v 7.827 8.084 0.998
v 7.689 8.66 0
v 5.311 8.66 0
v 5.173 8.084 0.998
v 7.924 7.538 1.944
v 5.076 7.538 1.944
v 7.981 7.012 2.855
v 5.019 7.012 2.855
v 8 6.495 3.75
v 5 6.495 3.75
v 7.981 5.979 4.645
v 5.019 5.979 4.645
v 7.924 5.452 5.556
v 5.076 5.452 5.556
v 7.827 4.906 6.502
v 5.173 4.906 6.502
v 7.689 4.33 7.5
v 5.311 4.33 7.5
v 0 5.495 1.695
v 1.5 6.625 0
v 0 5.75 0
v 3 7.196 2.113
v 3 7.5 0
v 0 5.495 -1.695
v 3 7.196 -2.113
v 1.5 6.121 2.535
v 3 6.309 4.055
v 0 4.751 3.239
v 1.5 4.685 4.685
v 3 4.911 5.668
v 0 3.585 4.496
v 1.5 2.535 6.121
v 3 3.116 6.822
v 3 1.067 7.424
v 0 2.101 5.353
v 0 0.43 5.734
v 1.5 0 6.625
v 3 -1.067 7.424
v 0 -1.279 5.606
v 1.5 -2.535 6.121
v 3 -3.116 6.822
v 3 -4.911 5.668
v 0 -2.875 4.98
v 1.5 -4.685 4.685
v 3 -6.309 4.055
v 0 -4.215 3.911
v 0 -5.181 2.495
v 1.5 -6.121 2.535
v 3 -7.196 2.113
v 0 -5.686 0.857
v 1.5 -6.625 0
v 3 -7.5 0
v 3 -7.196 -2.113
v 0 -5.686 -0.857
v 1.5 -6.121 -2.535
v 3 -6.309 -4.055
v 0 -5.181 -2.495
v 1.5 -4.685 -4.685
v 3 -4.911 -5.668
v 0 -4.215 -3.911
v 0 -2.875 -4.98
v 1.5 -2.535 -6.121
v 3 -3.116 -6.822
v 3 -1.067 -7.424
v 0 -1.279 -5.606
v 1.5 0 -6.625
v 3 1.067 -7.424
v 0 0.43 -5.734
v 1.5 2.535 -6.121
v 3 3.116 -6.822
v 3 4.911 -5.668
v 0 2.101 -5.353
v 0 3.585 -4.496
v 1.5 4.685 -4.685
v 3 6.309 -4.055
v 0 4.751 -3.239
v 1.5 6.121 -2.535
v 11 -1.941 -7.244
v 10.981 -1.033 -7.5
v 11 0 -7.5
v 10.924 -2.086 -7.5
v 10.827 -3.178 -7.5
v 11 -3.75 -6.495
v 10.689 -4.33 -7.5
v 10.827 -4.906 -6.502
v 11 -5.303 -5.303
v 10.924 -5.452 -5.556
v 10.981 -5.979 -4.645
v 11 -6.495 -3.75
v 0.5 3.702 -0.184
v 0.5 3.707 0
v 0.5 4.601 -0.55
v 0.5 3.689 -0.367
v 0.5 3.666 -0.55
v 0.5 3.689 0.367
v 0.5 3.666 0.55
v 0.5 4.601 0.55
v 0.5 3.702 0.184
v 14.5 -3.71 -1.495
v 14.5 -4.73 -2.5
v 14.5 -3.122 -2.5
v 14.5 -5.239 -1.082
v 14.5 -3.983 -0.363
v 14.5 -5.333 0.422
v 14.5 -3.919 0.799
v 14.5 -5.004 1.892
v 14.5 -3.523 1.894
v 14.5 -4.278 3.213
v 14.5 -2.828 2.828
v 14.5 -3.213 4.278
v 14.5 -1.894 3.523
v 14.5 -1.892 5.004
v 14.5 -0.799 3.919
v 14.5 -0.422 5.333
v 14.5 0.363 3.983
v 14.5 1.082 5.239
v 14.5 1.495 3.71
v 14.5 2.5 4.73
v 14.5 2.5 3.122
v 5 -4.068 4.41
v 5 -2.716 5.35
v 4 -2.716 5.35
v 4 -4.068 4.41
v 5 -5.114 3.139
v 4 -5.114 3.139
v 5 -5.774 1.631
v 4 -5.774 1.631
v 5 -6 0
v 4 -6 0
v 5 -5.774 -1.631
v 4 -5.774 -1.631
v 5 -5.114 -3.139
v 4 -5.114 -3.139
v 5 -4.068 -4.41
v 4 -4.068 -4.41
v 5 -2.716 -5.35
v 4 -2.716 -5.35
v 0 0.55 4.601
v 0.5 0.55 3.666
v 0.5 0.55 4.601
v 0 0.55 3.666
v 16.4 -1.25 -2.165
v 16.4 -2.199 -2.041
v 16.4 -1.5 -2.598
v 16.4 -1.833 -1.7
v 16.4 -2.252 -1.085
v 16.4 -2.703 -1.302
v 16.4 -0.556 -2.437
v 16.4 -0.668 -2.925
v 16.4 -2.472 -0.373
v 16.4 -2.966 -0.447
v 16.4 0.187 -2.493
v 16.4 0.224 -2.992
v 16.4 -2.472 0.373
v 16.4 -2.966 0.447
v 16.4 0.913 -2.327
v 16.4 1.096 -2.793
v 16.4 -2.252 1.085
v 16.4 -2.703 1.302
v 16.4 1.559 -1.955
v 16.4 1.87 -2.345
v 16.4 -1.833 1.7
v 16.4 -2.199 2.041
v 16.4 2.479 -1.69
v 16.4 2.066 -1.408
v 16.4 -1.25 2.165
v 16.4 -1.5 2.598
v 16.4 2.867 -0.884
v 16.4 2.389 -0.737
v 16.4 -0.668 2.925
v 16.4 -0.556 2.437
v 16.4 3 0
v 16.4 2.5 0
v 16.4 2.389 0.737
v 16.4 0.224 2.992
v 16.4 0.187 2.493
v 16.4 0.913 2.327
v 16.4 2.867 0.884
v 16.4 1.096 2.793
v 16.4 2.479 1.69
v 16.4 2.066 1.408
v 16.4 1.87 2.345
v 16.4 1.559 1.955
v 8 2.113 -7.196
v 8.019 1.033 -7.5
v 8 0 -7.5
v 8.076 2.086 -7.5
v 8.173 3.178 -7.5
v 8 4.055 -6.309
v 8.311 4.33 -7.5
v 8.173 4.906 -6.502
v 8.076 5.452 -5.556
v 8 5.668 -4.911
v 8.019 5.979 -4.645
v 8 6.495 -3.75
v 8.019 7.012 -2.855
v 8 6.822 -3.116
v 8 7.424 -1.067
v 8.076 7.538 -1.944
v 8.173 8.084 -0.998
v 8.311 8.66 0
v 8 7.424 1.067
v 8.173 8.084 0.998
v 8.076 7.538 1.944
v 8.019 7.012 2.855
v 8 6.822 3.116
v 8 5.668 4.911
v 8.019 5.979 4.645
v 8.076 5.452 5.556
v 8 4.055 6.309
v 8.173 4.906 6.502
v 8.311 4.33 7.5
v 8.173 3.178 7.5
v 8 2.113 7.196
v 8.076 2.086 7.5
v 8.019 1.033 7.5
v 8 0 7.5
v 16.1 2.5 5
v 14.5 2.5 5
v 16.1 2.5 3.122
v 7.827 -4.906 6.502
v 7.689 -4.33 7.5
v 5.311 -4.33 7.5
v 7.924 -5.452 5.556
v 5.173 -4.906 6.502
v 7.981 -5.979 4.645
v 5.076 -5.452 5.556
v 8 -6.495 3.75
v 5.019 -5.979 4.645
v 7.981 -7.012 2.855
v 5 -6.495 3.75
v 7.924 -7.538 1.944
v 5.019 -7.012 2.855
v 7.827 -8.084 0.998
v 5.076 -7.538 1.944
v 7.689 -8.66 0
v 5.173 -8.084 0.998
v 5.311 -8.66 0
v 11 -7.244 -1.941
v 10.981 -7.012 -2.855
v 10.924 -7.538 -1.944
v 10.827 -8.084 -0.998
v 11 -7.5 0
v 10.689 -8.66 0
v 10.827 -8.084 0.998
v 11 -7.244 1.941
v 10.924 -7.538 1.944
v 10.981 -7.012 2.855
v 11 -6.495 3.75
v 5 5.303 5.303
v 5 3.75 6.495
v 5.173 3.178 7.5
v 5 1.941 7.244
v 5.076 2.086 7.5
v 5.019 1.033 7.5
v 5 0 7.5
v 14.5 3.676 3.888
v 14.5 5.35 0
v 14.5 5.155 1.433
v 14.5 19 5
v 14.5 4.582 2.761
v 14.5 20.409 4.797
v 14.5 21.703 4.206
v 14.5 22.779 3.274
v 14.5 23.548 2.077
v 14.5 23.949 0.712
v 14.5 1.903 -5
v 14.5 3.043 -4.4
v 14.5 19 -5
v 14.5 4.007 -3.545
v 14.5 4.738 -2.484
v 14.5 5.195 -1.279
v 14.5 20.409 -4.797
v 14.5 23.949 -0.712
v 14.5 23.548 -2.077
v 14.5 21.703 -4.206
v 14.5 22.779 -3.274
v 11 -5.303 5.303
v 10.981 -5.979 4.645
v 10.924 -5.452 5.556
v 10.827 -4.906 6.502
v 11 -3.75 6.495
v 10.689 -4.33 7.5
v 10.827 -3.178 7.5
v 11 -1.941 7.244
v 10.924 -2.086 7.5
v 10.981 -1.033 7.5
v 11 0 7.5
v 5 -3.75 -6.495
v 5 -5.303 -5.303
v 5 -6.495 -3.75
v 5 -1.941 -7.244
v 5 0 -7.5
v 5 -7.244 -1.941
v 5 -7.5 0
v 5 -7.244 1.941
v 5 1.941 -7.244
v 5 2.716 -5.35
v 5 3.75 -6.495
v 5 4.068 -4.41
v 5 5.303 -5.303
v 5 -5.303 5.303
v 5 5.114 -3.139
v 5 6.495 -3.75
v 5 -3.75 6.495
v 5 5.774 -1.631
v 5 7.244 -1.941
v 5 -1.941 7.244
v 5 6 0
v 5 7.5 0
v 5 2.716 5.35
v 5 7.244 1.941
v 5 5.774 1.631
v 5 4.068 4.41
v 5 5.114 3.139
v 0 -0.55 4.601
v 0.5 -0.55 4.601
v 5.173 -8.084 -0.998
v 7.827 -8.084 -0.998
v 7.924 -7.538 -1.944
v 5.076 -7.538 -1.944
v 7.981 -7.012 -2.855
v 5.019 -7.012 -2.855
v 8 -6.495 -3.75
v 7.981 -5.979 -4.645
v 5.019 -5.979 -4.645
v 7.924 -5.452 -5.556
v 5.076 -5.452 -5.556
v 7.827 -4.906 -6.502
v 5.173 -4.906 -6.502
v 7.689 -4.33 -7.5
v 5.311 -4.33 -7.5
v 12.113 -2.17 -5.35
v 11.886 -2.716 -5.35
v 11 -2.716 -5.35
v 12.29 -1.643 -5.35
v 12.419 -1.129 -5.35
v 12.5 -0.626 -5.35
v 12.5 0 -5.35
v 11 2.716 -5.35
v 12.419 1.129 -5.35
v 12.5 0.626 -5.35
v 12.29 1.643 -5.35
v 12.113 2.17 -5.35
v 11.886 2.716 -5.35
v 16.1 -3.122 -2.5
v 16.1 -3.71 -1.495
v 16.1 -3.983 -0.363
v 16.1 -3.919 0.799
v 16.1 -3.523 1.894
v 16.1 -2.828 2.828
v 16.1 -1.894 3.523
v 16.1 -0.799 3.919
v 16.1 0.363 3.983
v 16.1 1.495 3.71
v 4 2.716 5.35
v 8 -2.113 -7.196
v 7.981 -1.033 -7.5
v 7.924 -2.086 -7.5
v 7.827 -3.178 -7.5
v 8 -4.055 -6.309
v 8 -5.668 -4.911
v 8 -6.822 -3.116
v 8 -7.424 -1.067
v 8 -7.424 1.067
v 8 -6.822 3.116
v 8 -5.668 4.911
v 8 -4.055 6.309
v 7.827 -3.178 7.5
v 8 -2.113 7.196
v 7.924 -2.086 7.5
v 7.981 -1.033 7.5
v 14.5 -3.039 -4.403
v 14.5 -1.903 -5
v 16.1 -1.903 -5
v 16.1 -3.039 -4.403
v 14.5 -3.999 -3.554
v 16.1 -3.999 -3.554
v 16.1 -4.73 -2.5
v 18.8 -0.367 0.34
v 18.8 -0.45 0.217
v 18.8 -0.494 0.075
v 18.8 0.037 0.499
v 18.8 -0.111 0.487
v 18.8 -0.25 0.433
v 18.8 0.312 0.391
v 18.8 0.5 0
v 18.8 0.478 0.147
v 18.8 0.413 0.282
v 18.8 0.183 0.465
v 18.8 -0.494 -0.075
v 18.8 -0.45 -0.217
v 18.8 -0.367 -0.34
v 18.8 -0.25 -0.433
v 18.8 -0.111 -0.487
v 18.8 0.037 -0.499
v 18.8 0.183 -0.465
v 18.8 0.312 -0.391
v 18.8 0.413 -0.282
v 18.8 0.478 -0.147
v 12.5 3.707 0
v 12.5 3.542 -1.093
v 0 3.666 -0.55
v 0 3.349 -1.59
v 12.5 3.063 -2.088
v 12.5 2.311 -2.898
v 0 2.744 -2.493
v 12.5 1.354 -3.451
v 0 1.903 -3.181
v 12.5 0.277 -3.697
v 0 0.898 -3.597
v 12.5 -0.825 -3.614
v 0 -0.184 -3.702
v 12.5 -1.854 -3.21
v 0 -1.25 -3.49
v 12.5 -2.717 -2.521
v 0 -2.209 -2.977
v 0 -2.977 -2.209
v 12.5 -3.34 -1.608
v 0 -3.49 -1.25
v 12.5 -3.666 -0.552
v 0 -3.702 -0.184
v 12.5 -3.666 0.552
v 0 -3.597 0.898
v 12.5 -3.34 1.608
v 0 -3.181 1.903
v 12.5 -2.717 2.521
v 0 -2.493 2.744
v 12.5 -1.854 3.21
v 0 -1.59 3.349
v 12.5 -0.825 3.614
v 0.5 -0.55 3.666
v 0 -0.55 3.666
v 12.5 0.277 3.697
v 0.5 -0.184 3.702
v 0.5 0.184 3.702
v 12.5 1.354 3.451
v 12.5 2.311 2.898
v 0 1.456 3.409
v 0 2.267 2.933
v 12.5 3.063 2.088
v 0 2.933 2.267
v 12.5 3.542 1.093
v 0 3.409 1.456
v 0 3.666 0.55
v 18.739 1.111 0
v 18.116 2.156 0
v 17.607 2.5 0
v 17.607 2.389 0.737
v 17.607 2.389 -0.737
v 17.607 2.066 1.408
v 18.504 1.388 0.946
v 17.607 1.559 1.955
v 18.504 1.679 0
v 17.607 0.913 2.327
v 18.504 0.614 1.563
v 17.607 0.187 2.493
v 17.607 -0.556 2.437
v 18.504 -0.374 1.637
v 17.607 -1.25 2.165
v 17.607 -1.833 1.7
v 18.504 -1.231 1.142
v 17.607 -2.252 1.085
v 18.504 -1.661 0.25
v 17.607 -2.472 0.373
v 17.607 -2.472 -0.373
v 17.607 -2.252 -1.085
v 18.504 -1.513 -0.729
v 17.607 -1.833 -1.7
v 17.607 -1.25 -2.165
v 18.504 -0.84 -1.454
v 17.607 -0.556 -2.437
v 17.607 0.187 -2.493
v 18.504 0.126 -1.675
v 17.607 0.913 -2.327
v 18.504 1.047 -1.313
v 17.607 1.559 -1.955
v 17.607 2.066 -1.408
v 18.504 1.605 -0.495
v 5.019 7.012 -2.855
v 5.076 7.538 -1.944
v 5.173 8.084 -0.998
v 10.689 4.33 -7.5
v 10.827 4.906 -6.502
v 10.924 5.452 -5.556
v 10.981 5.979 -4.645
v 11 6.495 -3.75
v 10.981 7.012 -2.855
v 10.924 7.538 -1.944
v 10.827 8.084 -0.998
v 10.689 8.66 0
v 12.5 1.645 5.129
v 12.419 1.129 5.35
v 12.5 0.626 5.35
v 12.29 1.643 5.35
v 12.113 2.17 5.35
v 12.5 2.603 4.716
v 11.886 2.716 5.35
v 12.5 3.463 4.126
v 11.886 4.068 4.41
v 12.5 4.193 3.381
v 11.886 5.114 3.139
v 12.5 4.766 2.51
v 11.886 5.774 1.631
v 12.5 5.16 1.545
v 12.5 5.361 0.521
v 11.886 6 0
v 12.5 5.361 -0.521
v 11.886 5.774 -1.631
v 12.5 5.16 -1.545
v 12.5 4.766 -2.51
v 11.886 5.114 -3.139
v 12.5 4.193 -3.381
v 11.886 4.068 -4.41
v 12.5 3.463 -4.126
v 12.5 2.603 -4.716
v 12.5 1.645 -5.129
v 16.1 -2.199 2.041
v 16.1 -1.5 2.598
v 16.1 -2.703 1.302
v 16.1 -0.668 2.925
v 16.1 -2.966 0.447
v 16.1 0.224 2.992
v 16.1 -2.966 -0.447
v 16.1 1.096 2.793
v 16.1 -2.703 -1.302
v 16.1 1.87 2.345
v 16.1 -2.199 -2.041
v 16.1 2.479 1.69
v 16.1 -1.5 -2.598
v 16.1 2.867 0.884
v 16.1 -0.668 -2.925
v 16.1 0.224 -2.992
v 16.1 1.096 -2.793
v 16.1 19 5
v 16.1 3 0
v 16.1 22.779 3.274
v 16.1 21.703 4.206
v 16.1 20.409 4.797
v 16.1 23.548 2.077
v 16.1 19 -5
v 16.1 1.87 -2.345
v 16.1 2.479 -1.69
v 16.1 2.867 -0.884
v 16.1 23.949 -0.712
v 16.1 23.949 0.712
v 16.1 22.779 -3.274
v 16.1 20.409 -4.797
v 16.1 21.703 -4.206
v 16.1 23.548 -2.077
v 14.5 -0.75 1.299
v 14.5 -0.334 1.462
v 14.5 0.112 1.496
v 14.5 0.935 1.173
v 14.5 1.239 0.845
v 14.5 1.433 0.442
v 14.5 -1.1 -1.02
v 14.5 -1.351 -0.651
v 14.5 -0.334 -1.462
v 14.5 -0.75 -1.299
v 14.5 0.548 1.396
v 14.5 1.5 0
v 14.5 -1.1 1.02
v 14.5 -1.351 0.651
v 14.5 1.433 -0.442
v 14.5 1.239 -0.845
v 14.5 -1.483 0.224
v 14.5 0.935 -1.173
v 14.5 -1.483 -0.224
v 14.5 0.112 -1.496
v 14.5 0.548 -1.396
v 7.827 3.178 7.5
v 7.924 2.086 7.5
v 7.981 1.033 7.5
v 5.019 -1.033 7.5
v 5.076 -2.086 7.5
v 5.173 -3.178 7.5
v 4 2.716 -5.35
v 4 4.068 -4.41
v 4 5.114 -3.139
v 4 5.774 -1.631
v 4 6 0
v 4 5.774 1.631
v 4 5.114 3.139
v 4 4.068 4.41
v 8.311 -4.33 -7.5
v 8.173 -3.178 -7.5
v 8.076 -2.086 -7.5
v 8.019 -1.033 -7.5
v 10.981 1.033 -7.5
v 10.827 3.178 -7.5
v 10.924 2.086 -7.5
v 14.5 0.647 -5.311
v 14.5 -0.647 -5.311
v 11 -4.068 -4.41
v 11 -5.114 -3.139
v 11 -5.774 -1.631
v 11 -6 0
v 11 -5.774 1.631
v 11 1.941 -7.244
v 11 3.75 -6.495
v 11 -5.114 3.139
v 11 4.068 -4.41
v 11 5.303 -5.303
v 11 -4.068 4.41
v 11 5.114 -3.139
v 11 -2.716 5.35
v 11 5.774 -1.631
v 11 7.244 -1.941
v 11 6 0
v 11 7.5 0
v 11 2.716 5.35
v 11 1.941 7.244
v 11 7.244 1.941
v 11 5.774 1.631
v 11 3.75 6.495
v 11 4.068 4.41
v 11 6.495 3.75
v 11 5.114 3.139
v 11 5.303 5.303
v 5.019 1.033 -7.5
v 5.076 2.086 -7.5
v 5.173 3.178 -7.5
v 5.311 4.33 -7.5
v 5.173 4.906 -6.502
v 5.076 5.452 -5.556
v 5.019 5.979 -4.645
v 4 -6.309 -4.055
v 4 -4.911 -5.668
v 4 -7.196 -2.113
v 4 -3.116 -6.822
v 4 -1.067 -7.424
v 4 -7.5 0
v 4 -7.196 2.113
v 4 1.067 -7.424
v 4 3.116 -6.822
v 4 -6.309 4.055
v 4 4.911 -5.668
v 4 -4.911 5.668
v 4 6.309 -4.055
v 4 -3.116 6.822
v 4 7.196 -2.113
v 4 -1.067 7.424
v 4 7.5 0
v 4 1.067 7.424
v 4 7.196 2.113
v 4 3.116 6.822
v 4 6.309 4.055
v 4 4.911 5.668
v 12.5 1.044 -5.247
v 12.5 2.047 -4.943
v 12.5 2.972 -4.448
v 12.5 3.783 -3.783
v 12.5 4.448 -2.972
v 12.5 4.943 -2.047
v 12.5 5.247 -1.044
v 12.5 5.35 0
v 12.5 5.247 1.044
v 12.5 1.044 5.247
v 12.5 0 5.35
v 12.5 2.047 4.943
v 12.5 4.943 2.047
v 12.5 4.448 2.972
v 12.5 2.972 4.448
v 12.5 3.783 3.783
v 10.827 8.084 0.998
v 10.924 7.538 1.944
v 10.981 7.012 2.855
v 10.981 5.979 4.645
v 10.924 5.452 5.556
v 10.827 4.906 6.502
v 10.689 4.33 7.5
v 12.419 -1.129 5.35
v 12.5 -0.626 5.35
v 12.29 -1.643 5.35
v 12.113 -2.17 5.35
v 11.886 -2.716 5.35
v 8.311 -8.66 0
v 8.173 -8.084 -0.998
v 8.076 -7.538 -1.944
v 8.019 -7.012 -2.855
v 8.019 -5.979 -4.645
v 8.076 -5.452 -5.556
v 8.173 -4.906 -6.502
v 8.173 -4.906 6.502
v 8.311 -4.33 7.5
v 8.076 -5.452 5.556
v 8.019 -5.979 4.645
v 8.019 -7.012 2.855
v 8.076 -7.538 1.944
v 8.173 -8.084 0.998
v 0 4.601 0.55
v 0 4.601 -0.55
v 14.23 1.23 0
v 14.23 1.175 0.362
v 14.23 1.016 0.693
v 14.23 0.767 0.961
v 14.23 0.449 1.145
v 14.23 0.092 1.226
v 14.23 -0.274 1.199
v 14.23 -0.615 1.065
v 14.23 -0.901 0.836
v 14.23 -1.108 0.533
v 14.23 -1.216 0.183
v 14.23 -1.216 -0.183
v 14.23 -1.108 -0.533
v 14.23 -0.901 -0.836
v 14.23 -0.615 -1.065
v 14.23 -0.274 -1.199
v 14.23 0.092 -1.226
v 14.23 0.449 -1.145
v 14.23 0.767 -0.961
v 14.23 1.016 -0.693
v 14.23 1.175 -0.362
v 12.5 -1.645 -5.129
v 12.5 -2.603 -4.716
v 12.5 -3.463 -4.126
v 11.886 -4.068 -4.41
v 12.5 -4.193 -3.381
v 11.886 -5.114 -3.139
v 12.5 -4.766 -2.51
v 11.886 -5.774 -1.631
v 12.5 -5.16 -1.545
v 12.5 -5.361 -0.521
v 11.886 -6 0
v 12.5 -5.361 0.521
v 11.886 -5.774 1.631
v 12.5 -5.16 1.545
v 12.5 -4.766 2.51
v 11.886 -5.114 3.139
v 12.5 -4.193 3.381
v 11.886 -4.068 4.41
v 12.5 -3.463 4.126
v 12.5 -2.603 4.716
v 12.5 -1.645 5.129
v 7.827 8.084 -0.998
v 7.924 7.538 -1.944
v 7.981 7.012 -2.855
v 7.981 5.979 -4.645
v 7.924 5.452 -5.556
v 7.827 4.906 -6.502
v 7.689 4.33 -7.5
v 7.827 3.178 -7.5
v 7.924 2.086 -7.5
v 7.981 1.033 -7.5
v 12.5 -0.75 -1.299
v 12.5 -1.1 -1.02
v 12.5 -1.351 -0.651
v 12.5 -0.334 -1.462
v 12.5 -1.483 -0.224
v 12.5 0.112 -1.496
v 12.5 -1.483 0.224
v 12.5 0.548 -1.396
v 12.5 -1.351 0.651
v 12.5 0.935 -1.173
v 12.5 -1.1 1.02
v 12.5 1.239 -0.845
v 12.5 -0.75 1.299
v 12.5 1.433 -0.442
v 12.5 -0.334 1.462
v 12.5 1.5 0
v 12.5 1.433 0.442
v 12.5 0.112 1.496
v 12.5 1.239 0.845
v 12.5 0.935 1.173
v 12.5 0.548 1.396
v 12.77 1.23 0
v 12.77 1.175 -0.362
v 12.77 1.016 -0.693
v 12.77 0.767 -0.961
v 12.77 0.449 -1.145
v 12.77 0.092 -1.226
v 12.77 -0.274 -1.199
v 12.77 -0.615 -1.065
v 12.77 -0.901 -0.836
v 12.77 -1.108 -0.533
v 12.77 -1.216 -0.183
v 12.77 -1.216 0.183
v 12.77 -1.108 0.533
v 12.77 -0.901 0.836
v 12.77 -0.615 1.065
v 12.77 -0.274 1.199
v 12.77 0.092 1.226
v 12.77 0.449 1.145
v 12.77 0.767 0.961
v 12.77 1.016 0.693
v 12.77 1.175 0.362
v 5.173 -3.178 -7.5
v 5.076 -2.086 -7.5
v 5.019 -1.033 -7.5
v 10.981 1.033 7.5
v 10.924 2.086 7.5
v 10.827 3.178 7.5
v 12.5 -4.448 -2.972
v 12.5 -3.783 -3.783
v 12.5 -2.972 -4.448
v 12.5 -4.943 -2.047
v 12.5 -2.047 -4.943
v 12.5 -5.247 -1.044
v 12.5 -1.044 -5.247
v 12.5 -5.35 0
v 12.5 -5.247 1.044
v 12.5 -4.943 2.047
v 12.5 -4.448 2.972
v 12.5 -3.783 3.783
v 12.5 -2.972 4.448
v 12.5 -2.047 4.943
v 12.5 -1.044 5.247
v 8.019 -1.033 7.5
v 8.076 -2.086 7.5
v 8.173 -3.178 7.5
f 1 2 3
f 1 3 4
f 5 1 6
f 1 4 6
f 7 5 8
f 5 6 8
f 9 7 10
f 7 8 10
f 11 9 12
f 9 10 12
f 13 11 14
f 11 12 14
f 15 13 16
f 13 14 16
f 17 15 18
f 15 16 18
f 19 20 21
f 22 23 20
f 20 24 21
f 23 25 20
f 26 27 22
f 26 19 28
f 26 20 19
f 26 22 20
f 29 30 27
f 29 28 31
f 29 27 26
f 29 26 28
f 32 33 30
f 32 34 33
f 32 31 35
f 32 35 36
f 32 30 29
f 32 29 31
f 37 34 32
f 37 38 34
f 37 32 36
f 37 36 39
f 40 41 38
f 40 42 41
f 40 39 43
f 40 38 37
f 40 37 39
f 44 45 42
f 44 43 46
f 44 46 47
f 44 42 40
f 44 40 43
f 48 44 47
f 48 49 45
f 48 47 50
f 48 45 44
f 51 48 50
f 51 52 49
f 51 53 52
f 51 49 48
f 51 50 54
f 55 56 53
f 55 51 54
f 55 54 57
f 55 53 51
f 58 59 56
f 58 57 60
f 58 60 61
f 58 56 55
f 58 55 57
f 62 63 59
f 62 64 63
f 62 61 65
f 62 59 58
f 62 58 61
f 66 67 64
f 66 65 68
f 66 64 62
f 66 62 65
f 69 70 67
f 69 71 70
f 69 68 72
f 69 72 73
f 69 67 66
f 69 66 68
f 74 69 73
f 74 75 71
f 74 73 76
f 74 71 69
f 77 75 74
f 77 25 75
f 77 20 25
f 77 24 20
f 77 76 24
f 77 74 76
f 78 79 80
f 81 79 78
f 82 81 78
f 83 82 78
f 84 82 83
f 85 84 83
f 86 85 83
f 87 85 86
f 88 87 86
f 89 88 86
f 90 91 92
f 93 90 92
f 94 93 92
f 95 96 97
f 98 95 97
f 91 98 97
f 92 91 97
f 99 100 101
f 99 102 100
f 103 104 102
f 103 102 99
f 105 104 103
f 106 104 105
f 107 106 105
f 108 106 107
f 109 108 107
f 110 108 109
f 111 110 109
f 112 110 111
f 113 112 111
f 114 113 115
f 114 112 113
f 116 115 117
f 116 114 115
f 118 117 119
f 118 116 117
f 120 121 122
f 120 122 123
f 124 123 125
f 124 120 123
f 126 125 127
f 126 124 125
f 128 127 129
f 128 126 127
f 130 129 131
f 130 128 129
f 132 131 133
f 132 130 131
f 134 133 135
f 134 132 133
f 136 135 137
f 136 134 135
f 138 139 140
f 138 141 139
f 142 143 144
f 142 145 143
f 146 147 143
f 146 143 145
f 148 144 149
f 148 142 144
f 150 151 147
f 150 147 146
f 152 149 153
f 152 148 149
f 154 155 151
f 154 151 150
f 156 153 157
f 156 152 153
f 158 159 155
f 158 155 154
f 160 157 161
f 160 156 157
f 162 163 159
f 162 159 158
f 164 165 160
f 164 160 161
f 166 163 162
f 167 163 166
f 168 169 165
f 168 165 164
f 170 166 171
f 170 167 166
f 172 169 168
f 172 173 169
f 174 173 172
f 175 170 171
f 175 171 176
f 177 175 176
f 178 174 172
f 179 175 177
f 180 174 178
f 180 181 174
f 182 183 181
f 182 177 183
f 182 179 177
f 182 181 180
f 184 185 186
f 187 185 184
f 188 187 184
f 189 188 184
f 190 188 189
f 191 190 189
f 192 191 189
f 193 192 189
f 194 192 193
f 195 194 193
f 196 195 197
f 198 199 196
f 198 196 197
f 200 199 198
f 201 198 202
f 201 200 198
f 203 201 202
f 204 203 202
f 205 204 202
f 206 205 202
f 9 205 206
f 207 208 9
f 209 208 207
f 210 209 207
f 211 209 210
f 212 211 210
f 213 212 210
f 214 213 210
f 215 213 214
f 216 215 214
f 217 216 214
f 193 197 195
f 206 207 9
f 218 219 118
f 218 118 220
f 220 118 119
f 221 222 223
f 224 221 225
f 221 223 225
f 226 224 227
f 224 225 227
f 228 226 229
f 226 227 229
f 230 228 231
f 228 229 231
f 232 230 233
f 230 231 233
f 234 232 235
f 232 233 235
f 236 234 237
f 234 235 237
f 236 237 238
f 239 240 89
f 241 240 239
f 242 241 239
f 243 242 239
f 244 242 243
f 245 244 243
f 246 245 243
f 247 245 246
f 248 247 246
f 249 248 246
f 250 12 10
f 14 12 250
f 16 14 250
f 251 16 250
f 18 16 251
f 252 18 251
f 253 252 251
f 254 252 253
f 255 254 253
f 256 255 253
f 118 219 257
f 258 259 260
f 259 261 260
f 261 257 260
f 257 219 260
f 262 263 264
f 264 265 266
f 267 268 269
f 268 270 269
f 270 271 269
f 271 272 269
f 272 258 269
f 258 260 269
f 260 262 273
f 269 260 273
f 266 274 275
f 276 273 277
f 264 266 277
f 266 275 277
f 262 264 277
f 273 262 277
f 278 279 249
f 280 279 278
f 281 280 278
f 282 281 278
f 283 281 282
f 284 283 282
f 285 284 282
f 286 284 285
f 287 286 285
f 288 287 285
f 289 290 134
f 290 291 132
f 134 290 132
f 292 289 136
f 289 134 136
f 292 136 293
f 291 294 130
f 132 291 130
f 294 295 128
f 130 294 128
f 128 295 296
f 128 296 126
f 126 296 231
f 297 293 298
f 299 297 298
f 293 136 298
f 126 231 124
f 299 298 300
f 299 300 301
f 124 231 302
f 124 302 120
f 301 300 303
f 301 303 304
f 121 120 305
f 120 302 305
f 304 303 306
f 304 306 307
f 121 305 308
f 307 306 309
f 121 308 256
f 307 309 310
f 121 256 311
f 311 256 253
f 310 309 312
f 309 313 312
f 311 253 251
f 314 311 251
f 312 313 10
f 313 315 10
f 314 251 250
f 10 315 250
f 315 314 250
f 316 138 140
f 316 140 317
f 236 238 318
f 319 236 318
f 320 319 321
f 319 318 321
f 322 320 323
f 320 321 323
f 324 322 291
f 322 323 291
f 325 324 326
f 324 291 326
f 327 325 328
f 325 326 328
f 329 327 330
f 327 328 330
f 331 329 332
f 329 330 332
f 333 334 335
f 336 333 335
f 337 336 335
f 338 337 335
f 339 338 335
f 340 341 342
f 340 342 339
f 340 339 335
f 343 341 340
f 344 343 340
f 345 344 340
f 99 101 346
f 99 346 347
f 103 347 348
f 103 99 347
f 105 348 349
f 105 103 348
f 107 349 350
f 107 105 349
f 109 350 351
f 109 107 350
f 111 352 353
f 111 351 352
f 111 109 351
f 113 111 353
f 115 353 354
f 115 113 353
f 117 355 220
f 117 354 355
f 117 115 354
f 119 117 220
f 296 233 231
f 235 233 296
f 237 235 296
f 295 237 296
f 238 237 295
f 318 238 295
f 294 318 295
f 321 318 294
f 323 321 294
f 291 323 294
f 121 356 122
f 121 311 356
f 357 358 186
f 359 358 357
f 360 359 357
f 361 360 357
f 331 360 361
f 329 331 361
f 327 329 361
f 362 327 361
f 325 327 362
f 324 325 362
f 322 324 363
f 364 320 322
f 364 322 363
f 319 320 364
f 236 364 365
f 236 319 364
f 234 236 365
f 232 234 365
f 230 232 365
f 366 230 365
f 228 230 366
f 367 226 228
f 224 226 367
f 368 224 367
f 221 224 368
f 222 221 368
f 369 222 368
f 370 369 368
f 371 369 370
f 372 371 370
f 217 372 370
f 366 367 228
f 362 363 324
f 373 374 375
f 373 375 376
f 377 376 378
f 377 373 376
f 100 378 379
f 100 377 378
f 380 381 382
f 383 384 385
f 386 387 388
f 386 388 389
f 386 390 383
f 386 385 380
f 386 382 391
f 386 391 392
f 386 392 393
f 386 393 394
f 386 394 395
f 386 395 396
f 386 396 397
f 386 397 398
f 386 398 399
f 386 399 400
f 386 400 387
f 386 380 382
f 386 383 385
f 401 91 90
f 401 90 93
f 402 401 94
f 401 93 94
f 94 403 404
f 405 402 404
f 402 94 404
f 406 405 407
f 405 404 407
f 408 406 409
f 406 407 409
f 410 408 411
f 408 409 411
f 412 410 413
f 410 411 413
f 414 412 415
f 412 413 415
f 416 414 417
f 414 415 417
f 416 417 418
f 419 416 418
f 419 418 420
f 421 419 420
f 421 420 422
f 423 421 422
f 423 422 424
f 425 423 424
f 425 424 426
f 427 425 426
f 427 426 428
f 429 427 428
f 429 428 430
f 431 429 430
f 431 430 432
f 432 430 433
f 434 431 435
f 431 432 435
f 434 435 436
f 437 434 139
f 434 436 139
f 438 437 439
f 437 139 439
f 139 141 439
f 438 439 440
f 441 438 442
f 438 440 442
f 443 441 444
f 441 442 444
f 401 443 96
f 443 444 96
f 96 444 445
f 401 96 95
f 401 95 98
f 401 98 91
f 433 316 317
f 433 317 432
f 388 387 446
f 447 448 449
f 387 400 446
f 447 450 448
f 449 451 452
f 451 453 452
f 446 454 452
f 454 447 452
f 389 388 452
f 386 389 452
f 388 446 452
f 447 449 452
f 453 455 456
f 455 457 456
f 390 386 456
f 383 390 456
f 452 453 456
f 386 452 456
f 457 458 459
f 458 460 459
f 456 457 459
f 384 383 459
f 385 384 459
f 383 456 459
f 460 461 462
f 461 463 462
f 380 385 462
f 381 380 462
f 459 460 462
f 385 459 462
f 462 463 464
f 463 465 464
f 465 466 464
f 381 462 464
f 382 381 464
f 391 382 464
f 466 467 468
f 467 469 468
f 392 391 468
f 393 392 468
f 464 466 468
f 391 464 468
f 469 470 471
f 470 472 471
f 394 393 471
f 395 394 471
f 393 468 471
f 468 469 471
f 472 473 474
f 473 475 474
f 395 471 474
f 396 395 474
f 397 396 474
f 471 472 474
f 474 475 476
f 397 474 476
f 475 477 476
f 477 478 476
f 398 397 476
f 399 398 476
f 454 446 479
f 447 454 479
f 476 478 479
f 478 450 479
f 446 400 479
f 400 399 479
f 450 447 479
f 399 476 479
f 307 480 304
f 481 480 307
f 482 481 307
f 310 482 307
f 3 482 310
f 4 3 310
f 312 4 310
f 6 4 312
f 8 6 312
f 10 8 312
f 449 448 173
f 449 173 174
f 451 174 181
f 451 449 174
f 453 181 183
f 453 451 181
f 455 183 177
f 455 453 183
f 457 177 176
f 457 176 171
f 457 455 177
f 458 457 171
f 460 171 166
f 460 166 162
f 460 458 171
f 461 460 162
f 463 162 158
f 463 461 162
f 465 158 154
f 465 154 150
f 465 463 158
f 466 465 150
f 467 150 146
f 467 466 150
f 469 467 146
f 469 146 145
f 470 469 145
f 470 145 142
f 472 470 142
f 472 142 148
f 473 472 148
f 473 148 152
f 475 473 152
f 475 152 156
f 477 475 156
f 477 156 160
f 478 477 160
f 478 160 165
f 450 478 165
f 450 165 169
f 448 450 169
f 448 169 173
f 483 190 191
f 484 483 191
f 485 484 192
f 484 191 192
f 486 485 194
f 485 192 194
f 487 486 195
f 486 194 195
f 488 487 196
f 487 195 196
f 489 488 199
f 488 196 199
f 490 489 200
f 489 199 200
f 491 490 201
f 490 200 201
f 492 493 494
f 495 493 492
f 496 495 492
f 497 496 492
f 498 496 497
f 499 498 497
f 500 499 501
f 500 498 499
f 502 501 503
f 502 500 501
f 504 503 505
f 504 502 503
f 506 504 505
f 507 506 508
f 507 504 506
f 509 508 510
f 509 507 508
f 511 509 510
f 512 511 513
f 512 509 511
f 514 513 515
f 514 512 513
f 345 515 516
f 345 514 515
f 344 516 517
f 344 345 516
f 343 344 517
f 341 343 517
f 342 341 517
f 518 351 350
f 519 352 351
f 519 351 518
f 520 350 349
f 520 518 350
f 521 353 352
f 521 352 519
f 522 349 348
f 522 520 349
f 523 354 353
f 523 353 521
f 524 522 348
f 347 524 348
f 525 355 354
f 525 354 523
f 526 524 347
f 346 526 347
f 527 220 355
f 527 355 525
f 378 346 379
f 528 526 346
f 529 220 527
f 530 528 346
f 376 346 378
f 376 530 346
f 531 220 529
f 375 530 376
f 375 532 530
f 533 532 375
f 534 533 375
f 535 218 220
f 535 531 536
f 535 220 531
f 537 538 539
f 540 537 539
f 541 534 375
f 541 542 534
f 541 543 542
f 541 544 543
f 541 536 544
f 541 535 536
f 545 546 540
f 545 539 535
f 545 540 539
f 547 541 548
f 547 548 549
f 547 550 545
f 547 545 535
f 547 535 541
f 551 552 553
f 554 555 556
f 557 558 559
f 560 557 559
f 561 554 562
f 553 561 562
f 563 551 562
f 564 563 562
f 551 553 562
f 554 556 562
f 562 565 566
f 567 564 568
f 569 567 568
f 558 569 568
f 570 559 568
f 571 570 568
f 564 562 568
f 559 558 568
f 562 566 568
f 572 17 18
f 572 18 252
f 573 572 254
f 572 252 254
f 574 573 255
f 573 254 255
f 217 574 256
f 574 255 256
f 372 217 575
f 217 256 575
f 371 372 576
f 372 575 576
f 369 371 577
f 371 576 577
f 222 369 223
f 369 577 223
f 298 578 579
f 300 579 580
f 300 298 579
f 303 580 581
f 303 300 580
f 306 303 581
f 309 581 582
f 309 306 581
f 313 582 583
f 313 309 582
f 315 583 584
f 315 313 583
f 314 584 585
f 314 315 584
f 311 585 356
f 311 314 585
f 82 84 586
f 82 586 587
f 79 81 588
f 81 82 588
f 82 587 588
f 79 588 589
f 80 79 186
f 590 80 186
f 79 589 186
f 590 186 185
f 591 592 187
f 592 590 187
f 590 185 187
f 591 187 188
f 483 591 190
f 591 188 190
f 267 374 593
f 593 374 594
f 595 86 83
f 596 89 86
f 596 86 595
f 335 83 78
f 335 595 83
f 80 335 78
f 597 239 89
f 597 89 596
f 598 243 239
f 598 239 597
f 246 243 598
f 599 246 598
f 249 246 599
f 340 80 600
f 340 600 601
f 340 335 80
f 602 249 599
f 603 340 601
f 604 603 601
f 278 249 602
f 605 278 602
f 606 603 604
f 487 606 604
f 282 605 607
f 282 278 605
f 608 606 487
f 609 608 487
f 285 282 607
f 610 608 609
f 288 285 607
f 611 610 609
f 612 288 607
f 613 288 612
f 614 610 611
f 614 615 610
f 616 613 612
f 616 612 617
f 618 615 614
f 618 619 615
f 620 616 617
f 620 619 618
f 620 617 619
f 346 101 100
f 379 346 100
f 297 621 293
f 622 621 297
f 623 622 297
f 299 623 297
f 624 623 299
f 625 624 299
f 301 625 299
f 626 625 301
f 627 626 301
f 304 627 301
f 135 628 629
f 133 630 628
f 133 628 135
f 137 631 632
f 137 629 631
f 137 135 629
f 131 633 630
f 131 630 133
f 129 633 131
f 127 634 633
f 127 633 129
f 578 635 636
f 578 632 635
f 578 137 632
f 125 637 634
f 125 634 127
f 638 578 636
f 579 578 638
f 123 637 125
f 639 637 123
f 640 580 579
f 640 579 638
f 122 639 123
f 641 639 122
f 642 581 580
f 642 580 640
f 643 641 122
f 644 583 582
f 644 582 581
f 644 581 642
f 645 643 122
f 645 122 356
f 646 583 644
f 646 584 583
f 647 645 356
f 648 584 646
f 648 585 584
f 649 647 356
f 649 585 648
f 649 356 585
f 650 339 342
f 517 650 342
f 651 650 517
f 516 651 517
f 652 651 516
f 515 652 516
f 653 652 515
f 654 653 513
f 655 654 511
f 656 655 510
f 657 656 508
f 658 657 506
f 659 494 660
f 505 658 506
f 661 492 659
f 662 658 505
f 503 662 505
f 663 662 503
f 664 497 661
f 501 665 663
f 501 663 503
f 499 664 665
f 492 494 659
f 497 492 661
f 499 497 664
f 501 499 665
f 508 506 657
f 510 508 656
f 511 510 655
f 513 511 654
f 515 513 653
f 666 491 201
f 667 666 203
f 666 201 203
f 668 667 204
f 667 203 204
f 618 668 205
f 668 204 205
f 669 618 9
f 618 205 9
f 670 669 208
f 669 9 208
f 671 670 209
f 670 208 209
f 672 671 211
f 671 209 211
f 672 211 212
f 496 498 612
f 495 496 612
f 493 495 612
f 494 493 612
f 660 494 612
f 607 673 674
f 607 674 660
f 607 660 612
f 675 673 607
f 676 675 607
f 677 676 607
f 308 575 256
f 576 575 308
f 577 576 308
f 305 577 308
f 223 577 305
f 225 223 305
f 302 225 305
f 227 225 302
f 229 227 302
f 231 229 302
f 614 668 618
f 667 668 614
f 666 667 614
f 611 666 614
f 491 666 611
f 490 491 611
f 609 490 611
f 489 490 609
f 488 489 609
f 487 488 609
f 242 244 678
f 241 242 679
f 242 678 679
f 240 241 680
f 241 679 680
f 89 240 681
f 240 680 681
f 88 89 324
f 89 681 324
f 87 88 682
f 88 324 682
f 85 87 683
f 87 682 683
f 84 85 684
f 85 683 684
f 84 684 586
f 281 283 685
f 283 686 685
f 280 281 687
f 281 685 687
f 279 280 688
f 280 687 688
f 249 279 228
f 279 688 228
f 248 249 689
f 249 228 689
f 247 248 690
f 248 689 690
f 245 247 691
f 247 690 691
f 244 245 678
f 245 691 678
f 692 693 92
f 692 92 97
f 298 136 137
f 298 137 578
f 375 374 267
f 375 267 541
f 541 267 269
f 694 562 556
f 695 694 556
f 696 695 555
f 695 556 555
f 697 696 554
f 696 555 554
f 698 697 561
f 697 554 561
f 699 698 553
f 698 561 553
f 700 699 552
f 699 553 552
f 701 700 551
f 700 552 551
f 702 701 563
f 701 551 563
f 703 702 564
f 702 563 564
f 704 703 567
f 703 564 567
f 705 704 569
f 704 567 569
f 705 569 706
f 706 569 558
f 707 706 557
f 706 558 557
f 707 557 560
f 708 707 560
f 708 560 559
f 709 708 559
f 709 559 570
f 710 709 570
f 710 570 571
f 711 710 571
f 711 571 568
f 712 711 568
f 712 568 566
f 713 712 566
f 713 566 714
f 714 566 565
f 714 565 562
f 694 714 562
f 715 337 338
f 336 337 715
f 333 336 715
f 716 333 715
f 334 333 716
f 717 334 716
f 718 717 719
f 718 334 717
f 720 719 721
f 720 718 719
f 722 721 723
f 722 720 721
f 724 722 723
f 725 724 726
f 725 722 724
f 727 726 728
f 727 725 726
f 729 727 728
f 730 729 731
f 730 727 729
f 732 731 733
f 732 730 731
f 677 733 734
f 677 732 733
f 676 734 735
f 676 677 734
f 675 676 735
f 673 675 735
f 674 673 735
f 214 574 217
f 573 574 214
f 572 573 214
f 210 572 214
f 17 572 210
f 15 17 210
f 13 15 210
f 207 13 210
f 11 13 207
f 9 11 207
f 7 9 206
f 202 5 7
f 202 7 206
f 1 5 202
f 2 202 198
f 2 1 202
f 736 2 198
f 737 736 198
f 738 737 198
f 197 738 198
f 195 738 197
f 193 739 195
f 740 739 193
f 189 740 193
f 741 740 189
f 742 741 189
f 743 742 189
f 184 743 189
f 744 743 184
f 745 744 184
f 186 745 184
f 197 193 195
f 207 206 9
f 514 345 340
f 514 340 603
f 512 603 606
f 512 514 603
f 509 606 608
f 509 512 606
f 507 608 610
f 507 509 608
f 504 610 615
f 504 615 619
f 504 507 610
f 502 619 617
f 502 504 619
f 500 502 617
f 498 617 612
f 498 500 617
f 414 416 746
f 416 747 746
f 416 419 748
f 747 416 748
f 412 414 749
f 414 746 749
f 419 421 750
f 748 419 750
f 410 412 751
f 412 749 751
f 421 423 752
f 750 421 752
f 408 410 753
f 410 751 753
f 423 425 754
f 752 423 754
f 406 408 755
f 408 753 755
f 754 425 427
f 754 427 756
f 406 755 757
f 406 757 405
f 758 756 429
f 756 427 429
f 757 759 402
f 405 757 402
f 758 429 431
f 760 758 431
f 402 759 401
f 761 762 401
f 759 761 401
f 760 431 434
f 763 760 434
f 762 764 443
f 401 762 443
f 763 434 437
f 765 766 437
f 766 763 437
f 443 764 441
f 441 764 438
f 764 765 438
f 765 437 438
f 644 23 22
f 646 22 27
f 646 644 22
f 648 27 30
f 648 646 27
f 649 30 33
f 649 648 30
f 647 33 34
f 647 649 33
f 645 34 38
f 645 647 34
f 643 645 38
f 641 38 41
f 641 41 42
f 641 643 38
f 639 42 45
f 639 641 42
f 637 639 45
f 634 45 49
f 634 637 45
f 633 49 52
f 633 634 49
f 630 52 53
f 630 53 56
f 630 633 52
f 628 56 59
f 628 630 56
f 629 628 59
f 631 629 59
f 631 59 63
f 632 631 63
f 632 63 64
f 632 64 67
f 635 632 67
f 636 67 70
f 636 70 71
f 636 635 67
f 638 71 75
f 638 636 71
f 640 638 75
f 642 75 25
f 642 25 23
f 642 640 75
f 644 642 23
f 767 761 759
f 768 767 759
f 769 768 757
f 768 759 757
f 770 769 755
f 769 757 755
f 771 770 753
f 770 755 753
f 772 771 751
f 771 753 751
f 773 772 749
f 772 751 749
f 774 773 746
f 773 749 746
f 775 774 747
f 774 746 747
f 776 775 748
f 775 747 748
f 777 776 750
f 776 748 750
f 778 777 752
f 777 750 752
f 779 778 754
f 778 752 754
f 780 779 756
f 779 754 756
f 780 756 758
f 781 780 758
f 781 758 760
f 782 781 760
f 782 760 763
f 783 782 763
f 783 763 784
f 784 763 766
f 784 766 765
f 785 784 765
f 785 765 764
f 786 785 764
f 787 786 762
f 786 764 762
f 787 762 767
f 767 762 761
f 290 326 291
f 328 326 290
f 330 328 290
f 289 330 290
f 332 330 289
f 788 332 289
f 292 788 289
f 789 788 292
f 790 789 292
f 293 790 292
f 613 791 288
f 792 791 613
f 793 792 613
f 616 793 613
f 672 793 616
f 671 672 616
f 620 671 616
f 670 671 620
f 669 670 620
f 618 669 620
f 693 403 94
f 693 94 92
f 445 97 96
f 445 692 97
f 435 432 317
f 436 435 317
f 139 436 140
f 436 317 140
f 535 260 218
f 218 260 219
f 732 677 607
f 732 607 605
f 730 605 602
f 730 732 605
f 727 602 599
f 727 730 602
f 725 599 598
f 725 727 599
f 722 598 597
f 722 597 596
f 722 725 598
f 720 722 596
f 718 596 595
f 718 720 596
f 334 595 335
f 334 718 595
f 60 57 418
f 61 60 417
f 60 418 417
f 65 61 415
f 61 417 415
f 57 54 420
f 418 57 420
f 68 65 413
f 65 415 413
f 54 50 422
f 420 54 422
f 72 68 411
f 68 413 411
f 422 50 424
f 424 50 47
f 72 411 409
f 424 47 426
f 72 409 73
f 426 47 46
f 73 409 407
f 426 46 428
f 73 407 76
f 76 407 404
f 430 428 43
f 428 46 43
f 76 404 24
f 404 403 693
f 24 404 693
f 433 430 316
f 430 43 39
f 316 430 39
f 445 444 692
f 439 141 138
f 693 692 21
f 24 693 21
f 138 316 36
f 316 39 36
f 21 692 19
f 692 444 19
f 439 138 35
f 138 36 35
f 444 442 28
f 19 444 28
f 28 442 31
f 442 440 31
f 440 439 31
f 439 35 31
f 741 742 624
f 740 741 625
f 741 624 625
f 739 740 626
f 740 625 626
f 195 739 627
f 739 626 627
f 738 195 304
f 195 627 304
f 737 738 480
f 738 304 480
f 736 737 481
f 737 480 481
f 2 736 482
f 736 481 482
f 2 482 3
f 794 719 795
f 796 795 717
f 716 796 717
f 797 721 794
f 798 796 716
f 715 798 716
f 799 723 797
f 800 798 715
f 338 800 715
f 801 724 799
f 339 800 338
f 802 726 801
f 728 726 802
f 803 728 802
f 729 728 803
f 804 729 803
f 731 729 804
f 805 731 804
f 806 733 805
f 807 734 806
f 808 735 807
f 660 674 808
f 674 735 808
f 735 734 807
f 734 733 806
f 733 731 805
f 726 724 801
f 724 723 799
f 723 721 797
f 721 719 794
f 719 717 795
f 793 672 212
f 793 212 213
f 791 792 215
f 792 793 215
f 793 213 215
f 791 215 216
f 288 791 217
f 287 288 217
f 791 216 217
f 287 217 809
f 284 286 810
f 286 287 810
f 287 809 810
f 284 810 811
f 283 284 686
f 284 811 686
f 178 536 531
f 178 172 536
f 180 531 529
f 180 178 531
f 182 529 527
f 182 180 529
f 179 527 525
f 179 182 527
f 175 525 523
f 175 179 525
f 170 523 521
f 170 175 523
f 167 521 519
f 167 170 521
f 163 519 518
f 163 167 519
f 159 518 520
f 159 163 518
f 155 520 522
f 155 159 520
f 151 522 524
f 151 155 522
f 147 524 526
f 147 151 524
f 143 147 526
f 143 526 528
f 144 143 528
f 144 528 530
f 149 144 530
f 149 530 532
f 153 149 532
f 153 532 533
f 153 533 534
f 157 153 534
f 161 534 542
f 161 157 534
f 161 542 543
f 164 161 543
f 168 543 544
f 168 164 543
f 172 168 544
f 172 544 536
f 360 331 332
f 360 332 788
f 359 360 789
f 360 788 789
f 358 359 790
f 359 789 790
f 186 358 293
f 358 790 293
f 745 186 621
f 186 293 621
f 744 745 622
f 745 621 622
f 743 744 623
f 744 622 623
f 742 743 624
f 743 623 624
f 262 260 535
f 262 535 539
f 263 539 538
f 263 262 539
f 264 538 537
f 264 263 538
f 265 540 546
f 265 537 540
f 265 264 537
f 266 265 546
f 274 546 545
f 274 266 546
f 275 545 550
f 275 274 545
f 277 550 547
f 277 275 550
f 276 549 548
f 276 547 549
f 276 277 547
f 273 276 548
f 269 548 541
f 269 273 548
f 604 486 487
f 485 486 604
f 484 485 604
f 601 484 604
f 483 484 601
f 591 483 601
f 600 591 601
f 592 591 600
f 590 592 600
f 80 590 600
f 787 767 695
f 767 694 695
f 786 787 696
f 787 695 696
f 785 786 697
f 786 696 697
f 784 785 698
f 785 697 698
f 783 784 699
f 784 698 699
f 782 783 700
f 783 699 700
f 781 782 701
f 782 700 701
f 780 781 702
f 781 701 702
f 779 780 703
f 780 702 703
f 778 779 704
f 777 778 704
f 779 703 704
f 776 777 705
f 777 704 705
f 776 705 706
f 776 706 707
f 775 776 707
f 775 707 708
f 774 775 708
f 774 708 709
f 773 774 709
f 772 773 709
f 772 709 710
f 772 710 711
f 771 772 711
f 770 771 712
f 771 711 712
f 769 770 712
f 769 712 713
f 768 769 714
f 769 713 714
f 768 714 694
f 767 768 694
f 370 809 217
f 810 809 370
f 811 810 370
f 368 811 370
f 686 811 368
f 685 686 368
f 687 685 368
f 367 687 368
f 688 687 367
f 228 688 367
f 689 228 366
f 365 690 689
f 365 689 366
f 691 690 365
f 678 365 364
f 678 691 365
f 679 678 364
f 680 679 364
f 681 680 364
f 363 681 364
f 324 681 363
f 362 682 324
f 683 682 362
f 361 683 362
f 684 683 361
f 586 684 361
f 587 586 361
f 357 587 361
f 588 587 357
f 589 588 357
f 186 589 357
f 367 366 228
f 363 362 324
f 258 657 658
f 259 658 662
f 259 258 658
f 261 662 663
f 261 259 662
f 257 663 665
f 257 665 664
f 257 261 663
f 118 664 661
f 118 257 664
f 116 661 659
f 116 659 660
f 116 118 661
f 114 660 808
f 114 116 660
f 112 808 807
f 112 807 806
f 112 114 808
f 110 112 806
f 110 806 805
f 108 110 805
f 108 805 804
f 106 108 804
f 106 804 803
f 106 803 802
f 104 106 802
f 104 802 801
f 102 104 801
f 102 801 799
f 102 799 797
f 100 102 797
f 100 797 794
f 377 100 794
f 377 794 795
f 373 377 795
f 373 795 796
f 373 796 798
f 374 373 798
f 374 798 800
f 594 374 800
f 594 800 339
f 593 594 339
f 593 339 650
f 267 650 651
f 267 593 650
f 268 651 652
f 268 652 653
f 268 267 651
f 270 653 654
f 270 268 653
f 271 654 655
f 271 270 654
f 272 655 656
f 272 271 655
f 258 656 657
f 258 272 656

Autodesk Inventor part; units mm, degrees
sketch "Sketch_2" plane through (0, 0, 0) normal (0, 0, 1) x (1, 0, 0)
  line L0 (4, 0) -> (0, 0)
  line L1 (0, 0) -> (0, 5.75)
  line L2 (0, 5.75) -> (3, 7.5)
  line L3 (3, 7.5) -> (4, 7.5)
  line L4 (4, 7.5) -> (4, 0)
  line L5 (4, 0) -> (0, 0)
revolve "Revolution1" add sketch "Sketch_2" angle 360 about axis through (4, 0, 0) along (1, 0, 0)
sketch "Sketch_5" plane through (0, 0, 0) normal (0, 0, 1) x (1, 0, 0)
  line L0 (12.5, 0) -> (4, 0)
  line L1 (4, 0) -> (4, 6)
  line L2 (4, 6) -> (11.8865, 6)
  line L3 (11.8865, 6) -> (12.5, 5.3865)
  line L4 (12.5, 5.3865) -> (12.5, 0)
  line L5 (12.5, 0) -> (4, 0)
revolve "Revolution2" add sketch "Sketch_5" angle 360 about axis through (12.5, 0, 0) along (1, 0, 0)
thread "Thread1" size "M12x1" class "6g" standard "ISO Metric profile" full length
sketch "Sketch_13" plane through (12.5, 0, 0) normal (1, 0, 0) x (0, 0, -1)
  line L0 (-10, -20) -> (10, -20)
  line L1 (10, -20) -> (10, 20)
  line L2 (10, 20) -> (-10, 20)
  line L3 (-10, 20) -> (-10, -20)
  line L4 (-5.35, -10) -> (5.35, -10)
  line L5 (5.35, -10) -> (5.35, 10)
  line L6 (5.35, 10) -> (-5.35, 10)
  line L7 (-5.35, 10) -> (-5.35, -10)
extrude "Extrusion1" cut sketch "Sketch_13" against normal blind 8.5
sketch "Sketch_1" plane through (0, 0, 0) normal (0, 0, 1) x (1, 0, 0)
  line L0 (8, 0) -> (5, 0)
  line L1 (5, 0) -> (5, 7.5)
  line L2 (5, 7.5) -> (5.4019, 9)
  line L3 (5.4019, 9) -> (7.5981, 9)
  line L4 (7.5981, 9) -> (8, 7.5)
  line L5 (8, 7.5) -> (8, 0)
  line L6 (8, 0) -> (5, 0)
revolve "Revolution3" add sketch "Sketch_1" angle 360 about axis through (8, 0, 0) along (1, 0, 0)
sketch "Sketch_4" plane through (0, 0, 0) normal (0, 0, 1) x (1, 0, 0)
  line L0 (11, 0) -> (8, 0)
  line L1 (8, 0) -> (8, 7.5)
  line L2 (8, 7.5) -> (8.4019, 9)
  line L3 (8.4019, 9) -> (10.5981, 9)
  line L4 (10.5981, 9) -> (11, 7.5)
  line L5 (11, 7.5) -> (11, 0)
  line L6 (11, 0) -> (8, 0)
revolve "Revolution4" add sketch "Sketch_4" angle 360 about axis through (11, 0, 0) along (1, 0, 0)
sketch "Sketch_3" plane through (5, 0, 0) normal (1, 0, 0) x (0, 0, -1)
  line L0 (-15, -15) -> (15, -15)
  line L1 (15, -15) -> (15, 15)
  line L2 (15, 15) -> (-15, 15)
  line L3 (-15, 15) -> (-15, -15)
  line L4 (-7.5, 4.3301) -> (-7.5, -4.3301)
  line L5 (-7.5, -4.3301) -> (0, -8.6603)
  line L6 (0, -8.6603) -> (7.5, -4.3301)
  line L7 (7.5, -4.3301) -> (7.5, 4.3301)
  line L8 (7.5, 4.3301) -> (0, 8.6603)
  line L9 (0, 8.6603) -> (-7.5, 4.3301)
extrude "Extrusion2" cut sketch "Sketch_3" along normal blind 6
sketch "Sketch_7" plane through (0, 0, 0) normal (1, 0, 0) x (0, 1, 0)
  circle A0 centre (0, 0) radius 3.707
extrude "Extrusion3" cut sketch "Sketch_7" along normal blind 12.5
sketch "Sketch_6" plane through (0, 0, 0) normal (0, 0, 1) x (1, 0, 0)
  line L0 (14.5, 0) -> (12.5, 0)
  line L1 (12.5, 0) -> (12.5, 5.35)
  line L2 (12.5, 5.35) -> (14.5, 5.35)
  line L3 (14.5, 5.35) -> (14.5, 0)
  line L4 (14.5, 0) -> (12.5, 0)
revolve "Revolution5" add sketch "Sketch_6" angle 360 about axis through (14.5, 0, 0) along (1, 0, 0)
sketch "Sketch_8" plane through (0, 0, 0) normal (0, 0, 1) x (1, 0, 0)
  line L0 (14.5, 0) -> (12.5, 0)
  line L1 (12.5, 0) -> (12.5, 1.5)
  line L2 (12.5, 1.5) -> (12.7705, 1.2295)
  line L3 (12.7705, 1.2295) -> (14.2295, 1.2295)
  line L4 (14.2295, 1.2295) -> (14.5, 1.5)
  line L5 (14.5, 1.5) -> (14.5, 0)
  line L6 (14.5, 0) -> (12.5, 0)
revolve "Revolution6" cut sketch "Sketch_8" angle 360 about axis through (14.5, 0, 0) along (1, 0, 0)
thread "Thread2" size "M3x0.5" class "6H" standard "ISO Metric profile" full length
sketch "Sketch_9" plane through (0, 0, 0) normal (1, 0, 0) x (0, 1, 0)
  line L0 (0, 0.55) -> (0, -0.55)
  line L1 (0, -0.55) -> (4.6009, -0.55)
  line L2 (4.6009, -0.55) -> (4.6009, 0.55)
  line L3 (4.6009, 0.55) -> (0, 0.55)
extrude "Extrusion4" cut sketch "Sketch_9" along normal blind 0.5
sketch "Sketch_10" plane through (0, 0, 0) normal (1, 0, 0) x (0, 1, 0)
  line L0 (0.55, 4.6009) -> (-0.55, 4.6009)
  line L1 (-0.55, 4.6009) -> (-0.55, 0)
  line L2 (-0.55, 0) -> (0.55, 0)
  line L3 (0.55, 0) -> (0.55, 4.6009)
extrude "Extrusion5" cut sketch "Sketch_10" along normal blind 0.5
sketch "Sketch_14" plane through (14.5, 0, 0) normal (1, 0, 0) x (0, 0, -1)
  line L0 (-5, 19) -> (-5, 2.5)
  line L1 (-5, 2.5) -> (-3.1225, 2.5)
  arc A0 (-3.1225, 2.5) -> (2.5, -3.1225) centre (0, 0) ccw
  line L2 (2.5, -3.1225) -> (2.5, -4.73)
  arc A1 (2.5, -4.73) -> (5, -1.9033) centre (0, 0) ccw
  line L3 (5, -1.9033) -> (5, 19)
  arc A2 (5, 19) -> (-5, 19) centre (0, 19) ccw
extrude "Extrusion6" add sketch "Sketch_14" along normal blind 1.6
sketch "Sketch_15" plane through (0, 0, 0) normal (0, 0, 1) x (1, 0, 0)
  line L0 (18.8, 0) -> (16.1, 0)
  line L1 (16.1, 0) -> (16.1, 3)
  line L2 (16.1, 3) -> (16.4, 3)
  line L3 (16.4, 3) -> (16.4, 2.5)
  line L4 (16.4, 2.5) -> (17.607, 2.5)
  arc A0 (18.8, 0.5) -> (17.607, 2.5) centre (16.692, 0.5984) ccw
  line L5 (18.8, 0.5) -> (18.8, 0)
  line L6 (18.8, 0) -> (16.1, 0)
revolve "Revolution7" add sketch "Sketch_15" angle 360 about axis through (18.8, 0, 0) along (1, 0, 0)
ref_plane "1_to_k_XY" through (0.5, 0, 0) normal (1, 0, 0) x (0, 0, -1)
ref_plane "1_to_k_YZ" through (0.5, 0, 0) normal (0, 0, -1) x (0, 1, 0)
ref_plane "1_to_k_ZX" through (0.5, 0, 0) normal (0, 1, 0) x (1, 0, 0)
ref_plane "1_TO_2_XY" through (0, 0, 0) normal (1, 0, 0) x (0, 0, -1)
ref_plane "1_TO_2_YZ" through (0, 0, 0) normal (0, 0, -1) x (0, 1, 0)
ref_plane "1_TO_2_ZX" through (0, 0, 0) normal (0, 1, 0) x (1, 0, 0)
properties part number "LOCNL2_1"
